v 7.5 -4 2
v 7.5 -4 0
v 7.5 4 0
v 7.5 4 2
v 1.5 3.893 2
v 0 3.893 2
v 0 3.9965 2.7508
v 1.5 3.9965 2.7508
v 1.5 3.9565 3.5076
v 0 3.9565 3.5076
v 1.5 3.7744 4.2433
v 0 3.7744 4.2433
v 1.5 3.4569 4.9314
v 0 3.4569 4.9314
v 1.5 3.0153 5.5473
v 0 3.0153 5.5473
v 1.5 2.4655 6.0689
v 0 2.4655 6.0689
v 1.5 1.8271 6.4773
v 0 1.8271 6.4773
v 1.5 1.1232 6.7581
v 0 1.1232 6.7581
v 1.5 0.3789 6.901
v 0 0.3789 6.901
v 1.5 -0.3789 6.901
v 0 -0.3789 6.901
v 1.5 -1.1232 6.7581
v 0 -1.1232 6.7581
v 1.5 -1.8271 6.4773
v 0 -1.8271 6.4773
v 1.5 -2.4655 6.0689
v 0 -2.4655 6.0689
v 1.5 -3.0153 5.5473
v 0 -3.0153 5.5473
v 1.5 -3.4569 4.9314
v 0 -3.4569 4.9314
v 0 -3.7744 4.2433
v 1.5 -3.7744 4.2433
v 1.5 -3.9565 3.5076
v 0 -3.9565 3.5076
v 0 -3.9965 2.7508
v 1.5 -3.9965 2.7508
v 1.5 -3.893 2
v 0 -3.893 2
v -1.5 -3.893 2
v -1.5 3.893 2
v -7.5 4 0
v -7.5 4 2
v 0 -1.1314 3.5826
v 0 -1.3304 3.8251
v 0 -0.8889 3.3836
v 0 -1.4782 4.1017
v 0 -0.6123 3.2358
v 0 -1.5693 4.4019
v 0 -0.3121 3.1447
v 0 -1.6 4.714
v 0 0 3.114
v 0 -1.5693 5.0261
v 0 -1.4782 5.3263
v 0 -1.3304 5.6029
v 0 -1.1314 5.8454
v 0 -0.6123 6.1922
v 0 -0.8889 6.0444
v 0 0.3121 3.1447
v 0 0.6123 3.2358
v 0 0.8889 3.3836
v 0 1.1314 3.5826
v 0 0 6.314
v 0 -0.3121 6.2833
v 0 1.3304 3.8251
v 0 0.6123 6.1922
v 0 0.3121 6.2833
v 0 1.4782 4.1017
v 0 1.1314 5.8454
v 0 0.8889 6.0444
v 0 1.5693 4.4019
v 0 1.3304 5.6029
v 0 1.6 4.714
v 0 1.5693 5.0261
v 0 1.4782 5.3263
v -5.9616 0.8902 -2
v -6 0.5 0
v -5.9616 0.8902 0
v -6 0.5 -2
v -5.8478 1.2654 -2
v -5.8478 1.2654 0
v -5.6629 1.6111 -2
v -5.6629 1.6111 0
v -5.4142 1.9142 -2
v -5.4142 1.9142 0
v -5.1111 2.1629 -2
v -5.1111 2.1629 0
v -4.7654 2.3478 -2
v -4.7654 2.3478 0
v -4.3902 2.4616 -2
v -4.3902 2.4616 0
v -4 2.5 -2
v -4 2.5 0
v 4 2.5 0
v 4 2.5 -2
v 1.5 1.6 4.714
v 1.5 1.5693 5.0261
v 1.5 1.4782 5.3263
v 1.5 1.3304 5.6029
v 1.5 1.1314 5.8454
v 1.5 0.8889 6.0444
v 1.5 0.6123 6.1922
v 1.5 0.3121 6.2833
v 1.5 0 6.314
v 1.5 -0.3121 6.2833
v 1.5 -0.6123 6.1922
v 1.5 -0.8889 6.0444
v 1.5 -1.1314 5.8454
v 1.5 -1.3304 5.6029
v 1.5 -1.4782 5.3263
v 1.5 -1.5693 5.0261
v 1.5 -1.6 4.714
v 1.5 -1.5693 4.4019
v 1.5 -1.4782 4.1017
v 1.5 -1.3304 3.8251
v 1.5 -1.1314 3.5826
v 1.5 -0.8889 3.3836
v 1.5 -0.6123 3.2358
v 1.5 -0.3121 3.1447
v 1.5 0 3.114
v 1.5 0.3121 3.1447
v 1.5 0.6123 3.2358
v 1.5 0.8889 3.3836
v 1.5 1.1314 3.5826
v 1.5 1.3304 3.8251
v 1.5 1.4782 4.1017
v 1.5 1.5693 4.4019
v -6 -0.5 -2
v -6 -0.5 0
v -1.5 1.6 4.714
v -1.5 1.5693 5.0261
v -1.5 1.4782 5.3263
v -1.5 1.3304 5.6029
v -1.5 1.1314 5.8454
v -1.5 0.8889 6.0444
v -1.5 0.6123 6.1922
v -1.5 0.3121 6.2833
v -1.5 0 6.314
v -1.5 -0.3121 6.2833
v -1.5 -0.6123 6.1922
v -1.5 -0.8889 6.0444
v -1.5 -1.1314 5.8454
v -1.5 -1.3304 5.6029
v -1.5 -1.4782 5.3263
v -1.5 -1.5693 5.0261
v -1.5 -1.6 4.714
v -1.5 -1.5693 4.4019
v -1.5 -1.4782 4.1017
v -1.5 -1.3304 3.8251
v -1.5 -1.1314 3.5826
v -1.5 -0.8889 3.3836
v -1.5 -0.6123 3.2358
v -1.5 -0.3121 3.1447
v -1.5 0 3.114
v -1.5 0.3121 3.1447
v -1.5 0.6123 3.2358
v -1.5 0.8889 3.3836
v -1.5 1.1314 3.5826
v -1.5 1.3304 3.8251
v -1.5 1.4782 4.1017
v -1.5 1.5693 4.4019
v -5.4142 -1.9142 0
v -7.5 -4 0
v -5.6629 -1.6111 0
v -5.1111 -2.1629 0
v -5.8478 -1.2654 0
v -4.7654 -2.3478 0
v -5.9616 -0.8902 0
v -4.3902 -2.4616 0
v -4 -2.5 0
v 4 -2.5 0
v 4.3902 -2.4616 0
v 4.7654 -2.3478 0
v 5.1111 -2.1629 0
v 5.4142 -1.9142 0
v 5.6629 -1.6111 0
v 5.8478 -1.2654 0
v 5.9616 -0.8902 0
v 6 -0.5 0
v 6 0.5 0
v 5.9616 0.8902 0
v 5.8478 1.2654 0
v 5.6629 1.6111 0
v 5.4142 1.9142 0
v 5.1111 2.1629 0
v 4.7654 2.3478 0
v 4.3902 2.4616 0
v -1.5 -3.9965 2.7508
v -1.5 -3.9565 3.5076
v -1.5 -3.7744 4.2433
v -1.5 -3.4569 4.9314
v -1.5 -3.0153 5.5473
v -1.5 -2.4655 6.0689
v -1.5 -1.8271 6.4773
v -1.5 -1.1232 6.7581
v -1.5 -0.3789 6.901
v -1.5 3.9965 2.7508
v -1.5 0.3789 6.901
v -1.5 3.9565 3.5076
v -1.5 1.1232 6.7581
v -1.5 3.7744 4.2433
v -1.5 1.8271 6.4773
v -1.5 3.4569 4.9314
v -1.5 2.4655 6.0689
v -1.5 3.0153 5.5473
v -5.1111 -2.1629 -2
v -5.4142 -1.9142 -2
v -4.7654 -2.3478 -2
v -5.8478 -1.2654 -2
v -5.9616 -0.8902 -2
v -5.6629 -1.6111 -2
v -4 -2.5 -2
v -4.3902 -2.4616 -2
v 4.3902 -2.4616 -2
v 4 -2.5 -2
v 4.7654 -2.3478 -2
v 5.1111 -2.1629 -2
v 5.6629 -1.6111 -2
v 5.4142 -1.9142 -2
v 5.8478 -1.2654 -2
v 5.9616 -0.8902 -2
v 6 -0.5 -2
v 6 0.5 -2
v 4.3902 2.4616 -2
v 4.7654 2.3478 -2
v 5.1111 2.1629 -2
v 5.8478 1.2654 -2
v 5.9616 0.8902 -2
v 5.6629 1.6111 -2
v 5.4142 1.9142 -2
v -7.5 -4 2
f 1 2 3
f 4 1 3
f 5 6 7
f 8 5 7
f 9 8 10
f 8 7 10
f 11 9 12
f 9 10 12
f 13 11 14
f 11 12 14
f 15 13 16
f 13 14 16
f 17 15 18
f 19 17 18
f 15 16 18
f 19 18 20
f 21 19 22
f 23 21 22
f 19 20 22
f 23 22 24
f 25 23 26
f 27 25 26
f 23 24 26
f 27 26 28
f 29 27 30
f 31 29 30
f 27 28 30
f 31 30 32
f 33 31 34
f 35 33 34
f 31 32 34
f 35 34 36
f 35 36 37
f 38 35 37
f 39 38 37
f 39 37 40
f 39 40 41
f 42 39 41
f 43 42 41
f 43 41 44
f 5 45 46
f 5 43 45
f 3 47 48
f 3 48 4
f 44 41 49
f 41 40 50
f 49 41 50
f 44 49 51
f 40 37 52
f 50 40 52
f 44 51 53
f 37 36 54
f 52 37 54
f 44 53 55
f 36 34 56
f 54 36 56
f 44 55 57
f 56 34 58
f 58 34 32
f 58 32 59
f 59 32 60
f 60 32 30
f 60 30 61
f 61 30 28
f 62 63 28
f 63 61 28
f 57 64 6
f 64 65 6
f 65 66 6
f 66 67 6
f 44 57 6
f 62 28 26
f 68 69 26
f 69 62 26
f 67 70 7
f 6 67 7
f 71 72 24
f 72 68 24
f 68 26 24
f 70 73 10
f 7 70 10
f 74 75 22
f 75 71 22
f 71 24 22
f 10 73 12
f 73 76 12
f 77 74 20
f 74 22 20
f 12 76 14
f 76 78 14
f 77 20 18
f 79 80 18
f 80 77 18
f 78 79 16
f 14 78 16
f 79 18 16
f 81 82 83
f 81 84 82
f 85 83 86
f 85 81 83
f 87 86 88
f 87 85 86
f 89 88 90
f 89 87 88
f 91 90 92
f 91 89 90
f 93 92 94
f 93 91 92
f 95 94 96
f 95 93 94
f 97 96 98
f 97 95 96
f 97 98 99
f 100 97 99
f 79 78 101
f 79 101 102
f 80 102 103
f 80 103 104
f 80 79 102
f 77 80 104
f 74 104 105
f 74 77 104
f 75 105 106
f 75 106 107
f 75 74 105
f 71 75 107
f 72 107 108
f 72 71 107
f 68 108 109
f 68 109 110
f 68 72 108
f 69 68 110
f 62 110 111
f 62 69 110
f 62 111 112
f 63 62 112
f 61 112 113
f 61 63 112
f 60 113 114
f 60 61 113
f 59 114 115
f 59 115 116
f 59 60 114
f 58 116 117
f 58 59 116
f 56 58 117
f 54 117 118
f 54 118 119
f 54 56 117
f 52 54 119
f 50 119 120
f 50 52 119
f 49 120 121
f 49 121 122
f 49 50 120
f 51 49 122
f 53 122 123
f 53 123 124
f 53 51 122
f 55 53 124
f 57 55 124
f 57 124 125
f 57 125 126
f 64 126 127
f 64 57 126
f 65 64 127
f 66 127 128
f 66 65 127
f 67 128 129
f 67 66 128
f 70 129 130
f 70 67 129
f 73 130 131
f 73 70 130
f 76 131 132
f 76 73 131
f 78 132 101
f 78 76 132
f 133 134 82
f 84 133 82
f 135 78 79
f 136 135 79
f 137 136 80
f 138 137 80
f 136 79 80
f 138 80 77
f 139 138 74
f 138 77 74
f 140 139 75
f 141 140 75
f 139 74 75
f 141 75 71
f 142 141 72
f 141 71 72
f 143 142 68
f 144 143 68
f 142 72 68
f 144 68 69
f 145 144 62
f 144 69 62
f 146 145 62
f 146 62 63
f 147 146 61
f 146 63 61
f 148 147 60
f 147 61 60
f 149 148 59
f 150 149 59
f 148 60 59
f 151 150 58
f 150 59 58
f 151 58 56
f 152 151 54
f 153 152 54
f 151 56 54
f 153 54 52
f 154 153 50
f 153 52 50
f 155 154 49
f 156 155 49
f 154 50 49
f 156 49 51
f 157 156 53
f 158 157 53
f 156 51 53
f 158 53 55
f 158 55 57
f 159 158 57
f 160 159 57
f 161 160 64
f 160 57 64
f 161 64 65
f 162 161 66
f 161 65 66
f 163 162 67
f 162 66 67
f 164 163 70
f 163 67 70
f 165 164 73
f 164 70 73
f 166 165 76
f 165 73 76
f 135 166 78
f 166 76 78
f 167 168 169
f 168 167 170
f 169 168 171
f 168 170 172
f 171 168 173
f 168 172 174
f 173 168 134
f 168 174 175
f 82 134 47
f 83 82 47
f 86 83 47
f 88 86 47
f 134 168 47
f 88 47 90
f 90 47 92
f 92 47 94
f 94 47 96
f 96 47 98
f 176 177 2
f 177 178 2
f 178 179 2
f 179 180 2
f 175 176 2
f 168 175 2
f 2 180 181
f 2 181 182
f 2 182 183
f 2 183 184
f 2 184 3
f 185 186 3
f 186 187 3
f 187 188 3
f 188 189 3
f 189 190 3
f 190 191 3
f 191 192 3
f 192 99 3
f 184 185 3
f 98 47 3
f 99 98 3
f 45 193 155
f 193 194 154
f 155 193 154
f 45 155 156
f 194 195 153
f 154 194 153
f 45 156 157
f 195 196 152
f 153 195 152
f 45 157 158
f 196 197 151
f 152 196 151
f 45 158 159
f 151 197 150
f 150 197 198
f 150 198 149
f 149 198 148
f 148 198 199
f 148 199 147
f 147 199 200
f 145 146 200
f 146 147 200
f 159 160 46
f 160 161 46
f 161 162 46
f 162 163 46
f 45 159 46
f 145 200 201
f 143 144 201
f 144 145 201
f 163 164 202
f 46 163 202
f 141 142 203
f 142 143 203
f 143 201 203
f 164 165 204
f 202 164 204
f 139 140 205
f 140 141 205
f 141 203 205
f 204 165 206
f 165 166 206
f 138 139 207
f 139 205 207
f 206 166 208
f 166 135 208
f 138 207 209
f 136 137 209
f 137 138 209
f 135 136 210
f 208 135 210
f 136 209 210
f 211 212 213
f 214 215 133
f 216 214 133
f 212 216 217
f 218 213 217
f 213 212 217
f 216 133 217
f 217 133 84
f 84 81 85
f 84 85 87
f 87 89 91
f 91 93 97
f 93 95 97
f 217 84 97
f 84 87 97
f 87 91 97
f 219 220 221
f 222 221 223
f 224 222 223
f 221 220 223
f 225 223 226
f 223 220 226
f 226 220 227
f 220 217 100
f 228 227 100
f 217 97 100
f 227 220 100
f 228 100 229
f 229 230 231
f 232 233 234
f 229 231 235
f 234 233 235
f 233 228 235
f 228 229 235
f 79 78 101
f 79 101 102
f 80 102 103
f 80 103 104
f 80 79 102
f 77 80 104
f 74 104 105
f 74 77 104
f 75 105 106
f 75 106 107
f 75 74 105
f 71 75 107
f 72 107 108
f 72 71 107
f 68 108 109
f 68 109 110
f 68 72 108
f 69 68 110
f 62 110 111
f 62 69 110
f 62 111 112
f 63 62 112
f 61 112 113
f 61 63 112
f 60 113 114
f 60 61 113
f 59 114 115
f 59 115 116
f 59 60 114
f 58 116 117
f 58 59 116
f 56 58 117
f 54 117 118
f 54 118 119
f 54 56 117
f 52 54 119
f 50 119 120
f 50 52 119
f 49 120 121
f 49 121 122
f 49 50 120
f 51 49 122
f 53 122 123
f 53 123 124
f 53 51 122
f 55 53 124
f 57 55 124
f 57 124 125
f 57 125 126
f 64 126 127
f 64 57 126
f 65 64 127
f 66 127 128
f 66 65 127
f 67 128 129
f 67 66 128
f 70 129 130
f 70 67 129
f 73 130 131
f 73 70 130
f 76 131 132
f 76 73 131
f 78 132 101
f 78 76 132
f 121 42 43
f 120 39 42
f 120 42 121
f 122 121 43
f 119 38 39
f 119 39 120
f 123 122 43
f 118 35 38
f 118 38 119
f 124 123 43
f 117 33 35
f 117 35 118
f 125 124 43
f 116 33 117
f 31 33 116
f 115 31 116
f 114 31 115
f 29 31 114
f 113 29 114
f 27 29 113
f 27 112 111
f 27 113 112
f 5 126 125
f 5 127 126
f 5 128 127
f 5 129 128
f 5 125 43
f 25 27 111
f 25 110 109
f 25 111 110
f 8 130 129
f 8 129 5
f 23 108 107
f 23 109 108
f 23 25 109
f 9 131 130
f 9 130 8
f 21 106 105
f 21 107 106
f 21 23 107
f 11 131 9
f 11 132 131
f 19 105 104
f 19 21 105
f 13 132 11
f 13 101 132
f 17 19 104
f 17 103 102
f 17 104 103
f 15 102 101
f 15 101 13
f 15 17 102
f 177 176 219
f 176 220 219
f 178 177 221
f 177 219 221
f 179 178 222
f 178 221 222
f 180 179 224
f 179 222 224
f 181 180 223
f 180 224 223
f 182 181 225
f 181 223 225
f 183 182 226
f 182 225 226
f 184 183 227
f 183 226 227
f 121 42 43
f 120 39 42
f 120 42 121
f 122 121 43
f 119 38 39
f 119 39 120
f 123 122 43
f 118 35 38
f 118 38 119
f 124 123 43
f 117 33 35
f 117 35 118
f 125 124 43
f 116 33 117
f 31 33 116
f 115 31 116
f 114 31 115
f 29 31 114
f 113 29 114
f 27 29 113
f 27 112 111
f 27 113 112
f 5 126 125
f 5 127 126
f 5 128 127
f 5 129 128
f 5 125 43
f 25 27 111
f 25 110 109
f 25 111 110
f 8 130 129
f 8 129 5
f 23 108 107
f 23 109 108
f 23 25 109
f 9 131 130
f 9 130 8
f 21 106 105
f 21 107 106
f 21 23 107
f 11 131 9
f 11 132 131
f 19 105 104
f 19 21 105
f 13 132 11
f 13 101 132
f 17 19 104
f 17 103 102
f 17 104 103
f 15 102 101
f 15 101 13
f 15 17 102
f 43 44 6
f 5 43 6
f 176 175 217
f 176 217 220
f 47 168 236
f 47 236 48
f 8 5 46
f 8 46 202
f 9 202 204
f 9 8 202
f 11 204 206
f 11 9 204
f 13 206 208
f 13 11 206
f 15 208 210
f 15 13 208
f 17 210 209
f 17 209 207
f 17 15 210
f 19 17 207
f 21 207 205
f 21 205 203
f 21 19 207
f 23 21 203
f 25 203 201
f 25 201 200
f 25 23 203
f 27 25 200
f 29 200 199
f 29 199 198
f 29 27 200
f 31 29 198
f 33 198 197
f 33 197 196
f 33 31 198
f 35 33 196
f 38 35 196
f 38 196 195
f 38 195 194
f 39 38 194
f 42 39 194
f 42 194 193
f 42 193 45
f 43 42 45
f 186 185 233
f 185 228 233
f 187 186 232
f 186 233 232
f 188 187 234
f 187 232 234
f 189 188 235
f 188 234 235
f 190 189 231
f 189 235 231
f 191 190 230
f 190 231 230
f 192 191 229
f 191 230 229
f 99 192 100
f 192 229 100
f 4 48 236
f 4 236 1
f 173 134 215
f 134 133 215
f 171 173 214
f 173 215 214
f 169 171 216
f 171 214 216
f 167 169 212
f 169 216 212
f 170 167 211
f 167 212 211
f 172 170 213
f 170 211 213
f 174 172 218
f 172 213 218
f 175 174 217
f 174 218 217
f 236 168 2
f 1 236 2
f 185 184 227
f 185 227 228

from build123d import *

# Parameters (mm, degrees)
F0_W          = 12
F0_H          = 5
F1_DEPTH      = 2
F2_R          = 2
F3_W          = 15
F3_H          = 8
F4_DEPTH      = 2
F6_DEPTH      = 1.5
F7_DEPTH      = 1.5
F7_DEPTH_BACK = 1.5
F8_R          = 1.6
F9_DEPTH      = 1.5
F9_DEPTH_BACK = 1.5


with BuildPart() as f1:
    # F0 (on Top) → F1 (new body)
    with BuildSketch(Plane.XY):
        Rectangle(F0_W, F0_H)
    extrude(amount=-F1_DEPTH)

    # F2
    f2_edges = [f1.edges().sort_by_distance(p)[0] for p in [
        (6, 2.5, -1),
        (6, -2.5, -1),
        (-6, -2.5, -1),
        (-6, 2.5, -1),
    ]]
    fillet(f2_edges, radius=F2_R)

    # F3 (on Top) → F4 (join)
    with BuildSketch(Plane.XY):
        Rectangle(F3_W, F3_H)
    extrude(amount=F4_DEPTH)


with BuildPart() as f6:
    # F5 (on Right) → F6 (new body)
    with BuildSketch(Plane.YZ):
        with BuildLine():
            Line((-3.8929907368, 2), (3.8929907368, 2))
            ThreePointArc((3.8929907368, 2), (0, 6.9190337989), (-3.8929907368, 2))
        make_face()
    extrude(amount=F6_DEPTH)


with BuildPart() as f7:
    # F5 (on Right) → F7 (new body, two sides)
    with BuildSketch(Plane.YZ) as f7_sk:
        with BuildLine():
            Line((-3.8929907368, 2), (3.8929907368, 2))
            ThreePointArc((3.8929907368, 2), (0, 6.9190337989), (-3.8929907368, 2))
        make_face()
    extrude(amount=F7_DEPTH)
    extrude(f7_sk.sketch, amount=-F7_DEPTH_BACK)


with BuildPart() as f9_tool:
    # F8 (on Right) → F9 (new body, two sides)
    with BuildSketch(Plane.YZ) as f9_sk:
        with Locations((0, 4.7139995731)):
            Circle(F8_R)
    extrude(amount=-F9_DEPTH)
    extrude(f9_sk.sketch, amount=F9_DEPTH_BACK)


with BuildPart() as f6_1:
    add(f6.part)

    # F9: cut by f9_tool
    add(f9_tool.part, mode=Mode.SUBTRACT)


with BuildPart() as f7_1:
    add(f7.part)

    # F9: cut by f9_tool
    add(f9_tool.part, mode=Mode.SUBTRACT)


solid = Compound([f1.part, f6_1.part, f7_1.part])
